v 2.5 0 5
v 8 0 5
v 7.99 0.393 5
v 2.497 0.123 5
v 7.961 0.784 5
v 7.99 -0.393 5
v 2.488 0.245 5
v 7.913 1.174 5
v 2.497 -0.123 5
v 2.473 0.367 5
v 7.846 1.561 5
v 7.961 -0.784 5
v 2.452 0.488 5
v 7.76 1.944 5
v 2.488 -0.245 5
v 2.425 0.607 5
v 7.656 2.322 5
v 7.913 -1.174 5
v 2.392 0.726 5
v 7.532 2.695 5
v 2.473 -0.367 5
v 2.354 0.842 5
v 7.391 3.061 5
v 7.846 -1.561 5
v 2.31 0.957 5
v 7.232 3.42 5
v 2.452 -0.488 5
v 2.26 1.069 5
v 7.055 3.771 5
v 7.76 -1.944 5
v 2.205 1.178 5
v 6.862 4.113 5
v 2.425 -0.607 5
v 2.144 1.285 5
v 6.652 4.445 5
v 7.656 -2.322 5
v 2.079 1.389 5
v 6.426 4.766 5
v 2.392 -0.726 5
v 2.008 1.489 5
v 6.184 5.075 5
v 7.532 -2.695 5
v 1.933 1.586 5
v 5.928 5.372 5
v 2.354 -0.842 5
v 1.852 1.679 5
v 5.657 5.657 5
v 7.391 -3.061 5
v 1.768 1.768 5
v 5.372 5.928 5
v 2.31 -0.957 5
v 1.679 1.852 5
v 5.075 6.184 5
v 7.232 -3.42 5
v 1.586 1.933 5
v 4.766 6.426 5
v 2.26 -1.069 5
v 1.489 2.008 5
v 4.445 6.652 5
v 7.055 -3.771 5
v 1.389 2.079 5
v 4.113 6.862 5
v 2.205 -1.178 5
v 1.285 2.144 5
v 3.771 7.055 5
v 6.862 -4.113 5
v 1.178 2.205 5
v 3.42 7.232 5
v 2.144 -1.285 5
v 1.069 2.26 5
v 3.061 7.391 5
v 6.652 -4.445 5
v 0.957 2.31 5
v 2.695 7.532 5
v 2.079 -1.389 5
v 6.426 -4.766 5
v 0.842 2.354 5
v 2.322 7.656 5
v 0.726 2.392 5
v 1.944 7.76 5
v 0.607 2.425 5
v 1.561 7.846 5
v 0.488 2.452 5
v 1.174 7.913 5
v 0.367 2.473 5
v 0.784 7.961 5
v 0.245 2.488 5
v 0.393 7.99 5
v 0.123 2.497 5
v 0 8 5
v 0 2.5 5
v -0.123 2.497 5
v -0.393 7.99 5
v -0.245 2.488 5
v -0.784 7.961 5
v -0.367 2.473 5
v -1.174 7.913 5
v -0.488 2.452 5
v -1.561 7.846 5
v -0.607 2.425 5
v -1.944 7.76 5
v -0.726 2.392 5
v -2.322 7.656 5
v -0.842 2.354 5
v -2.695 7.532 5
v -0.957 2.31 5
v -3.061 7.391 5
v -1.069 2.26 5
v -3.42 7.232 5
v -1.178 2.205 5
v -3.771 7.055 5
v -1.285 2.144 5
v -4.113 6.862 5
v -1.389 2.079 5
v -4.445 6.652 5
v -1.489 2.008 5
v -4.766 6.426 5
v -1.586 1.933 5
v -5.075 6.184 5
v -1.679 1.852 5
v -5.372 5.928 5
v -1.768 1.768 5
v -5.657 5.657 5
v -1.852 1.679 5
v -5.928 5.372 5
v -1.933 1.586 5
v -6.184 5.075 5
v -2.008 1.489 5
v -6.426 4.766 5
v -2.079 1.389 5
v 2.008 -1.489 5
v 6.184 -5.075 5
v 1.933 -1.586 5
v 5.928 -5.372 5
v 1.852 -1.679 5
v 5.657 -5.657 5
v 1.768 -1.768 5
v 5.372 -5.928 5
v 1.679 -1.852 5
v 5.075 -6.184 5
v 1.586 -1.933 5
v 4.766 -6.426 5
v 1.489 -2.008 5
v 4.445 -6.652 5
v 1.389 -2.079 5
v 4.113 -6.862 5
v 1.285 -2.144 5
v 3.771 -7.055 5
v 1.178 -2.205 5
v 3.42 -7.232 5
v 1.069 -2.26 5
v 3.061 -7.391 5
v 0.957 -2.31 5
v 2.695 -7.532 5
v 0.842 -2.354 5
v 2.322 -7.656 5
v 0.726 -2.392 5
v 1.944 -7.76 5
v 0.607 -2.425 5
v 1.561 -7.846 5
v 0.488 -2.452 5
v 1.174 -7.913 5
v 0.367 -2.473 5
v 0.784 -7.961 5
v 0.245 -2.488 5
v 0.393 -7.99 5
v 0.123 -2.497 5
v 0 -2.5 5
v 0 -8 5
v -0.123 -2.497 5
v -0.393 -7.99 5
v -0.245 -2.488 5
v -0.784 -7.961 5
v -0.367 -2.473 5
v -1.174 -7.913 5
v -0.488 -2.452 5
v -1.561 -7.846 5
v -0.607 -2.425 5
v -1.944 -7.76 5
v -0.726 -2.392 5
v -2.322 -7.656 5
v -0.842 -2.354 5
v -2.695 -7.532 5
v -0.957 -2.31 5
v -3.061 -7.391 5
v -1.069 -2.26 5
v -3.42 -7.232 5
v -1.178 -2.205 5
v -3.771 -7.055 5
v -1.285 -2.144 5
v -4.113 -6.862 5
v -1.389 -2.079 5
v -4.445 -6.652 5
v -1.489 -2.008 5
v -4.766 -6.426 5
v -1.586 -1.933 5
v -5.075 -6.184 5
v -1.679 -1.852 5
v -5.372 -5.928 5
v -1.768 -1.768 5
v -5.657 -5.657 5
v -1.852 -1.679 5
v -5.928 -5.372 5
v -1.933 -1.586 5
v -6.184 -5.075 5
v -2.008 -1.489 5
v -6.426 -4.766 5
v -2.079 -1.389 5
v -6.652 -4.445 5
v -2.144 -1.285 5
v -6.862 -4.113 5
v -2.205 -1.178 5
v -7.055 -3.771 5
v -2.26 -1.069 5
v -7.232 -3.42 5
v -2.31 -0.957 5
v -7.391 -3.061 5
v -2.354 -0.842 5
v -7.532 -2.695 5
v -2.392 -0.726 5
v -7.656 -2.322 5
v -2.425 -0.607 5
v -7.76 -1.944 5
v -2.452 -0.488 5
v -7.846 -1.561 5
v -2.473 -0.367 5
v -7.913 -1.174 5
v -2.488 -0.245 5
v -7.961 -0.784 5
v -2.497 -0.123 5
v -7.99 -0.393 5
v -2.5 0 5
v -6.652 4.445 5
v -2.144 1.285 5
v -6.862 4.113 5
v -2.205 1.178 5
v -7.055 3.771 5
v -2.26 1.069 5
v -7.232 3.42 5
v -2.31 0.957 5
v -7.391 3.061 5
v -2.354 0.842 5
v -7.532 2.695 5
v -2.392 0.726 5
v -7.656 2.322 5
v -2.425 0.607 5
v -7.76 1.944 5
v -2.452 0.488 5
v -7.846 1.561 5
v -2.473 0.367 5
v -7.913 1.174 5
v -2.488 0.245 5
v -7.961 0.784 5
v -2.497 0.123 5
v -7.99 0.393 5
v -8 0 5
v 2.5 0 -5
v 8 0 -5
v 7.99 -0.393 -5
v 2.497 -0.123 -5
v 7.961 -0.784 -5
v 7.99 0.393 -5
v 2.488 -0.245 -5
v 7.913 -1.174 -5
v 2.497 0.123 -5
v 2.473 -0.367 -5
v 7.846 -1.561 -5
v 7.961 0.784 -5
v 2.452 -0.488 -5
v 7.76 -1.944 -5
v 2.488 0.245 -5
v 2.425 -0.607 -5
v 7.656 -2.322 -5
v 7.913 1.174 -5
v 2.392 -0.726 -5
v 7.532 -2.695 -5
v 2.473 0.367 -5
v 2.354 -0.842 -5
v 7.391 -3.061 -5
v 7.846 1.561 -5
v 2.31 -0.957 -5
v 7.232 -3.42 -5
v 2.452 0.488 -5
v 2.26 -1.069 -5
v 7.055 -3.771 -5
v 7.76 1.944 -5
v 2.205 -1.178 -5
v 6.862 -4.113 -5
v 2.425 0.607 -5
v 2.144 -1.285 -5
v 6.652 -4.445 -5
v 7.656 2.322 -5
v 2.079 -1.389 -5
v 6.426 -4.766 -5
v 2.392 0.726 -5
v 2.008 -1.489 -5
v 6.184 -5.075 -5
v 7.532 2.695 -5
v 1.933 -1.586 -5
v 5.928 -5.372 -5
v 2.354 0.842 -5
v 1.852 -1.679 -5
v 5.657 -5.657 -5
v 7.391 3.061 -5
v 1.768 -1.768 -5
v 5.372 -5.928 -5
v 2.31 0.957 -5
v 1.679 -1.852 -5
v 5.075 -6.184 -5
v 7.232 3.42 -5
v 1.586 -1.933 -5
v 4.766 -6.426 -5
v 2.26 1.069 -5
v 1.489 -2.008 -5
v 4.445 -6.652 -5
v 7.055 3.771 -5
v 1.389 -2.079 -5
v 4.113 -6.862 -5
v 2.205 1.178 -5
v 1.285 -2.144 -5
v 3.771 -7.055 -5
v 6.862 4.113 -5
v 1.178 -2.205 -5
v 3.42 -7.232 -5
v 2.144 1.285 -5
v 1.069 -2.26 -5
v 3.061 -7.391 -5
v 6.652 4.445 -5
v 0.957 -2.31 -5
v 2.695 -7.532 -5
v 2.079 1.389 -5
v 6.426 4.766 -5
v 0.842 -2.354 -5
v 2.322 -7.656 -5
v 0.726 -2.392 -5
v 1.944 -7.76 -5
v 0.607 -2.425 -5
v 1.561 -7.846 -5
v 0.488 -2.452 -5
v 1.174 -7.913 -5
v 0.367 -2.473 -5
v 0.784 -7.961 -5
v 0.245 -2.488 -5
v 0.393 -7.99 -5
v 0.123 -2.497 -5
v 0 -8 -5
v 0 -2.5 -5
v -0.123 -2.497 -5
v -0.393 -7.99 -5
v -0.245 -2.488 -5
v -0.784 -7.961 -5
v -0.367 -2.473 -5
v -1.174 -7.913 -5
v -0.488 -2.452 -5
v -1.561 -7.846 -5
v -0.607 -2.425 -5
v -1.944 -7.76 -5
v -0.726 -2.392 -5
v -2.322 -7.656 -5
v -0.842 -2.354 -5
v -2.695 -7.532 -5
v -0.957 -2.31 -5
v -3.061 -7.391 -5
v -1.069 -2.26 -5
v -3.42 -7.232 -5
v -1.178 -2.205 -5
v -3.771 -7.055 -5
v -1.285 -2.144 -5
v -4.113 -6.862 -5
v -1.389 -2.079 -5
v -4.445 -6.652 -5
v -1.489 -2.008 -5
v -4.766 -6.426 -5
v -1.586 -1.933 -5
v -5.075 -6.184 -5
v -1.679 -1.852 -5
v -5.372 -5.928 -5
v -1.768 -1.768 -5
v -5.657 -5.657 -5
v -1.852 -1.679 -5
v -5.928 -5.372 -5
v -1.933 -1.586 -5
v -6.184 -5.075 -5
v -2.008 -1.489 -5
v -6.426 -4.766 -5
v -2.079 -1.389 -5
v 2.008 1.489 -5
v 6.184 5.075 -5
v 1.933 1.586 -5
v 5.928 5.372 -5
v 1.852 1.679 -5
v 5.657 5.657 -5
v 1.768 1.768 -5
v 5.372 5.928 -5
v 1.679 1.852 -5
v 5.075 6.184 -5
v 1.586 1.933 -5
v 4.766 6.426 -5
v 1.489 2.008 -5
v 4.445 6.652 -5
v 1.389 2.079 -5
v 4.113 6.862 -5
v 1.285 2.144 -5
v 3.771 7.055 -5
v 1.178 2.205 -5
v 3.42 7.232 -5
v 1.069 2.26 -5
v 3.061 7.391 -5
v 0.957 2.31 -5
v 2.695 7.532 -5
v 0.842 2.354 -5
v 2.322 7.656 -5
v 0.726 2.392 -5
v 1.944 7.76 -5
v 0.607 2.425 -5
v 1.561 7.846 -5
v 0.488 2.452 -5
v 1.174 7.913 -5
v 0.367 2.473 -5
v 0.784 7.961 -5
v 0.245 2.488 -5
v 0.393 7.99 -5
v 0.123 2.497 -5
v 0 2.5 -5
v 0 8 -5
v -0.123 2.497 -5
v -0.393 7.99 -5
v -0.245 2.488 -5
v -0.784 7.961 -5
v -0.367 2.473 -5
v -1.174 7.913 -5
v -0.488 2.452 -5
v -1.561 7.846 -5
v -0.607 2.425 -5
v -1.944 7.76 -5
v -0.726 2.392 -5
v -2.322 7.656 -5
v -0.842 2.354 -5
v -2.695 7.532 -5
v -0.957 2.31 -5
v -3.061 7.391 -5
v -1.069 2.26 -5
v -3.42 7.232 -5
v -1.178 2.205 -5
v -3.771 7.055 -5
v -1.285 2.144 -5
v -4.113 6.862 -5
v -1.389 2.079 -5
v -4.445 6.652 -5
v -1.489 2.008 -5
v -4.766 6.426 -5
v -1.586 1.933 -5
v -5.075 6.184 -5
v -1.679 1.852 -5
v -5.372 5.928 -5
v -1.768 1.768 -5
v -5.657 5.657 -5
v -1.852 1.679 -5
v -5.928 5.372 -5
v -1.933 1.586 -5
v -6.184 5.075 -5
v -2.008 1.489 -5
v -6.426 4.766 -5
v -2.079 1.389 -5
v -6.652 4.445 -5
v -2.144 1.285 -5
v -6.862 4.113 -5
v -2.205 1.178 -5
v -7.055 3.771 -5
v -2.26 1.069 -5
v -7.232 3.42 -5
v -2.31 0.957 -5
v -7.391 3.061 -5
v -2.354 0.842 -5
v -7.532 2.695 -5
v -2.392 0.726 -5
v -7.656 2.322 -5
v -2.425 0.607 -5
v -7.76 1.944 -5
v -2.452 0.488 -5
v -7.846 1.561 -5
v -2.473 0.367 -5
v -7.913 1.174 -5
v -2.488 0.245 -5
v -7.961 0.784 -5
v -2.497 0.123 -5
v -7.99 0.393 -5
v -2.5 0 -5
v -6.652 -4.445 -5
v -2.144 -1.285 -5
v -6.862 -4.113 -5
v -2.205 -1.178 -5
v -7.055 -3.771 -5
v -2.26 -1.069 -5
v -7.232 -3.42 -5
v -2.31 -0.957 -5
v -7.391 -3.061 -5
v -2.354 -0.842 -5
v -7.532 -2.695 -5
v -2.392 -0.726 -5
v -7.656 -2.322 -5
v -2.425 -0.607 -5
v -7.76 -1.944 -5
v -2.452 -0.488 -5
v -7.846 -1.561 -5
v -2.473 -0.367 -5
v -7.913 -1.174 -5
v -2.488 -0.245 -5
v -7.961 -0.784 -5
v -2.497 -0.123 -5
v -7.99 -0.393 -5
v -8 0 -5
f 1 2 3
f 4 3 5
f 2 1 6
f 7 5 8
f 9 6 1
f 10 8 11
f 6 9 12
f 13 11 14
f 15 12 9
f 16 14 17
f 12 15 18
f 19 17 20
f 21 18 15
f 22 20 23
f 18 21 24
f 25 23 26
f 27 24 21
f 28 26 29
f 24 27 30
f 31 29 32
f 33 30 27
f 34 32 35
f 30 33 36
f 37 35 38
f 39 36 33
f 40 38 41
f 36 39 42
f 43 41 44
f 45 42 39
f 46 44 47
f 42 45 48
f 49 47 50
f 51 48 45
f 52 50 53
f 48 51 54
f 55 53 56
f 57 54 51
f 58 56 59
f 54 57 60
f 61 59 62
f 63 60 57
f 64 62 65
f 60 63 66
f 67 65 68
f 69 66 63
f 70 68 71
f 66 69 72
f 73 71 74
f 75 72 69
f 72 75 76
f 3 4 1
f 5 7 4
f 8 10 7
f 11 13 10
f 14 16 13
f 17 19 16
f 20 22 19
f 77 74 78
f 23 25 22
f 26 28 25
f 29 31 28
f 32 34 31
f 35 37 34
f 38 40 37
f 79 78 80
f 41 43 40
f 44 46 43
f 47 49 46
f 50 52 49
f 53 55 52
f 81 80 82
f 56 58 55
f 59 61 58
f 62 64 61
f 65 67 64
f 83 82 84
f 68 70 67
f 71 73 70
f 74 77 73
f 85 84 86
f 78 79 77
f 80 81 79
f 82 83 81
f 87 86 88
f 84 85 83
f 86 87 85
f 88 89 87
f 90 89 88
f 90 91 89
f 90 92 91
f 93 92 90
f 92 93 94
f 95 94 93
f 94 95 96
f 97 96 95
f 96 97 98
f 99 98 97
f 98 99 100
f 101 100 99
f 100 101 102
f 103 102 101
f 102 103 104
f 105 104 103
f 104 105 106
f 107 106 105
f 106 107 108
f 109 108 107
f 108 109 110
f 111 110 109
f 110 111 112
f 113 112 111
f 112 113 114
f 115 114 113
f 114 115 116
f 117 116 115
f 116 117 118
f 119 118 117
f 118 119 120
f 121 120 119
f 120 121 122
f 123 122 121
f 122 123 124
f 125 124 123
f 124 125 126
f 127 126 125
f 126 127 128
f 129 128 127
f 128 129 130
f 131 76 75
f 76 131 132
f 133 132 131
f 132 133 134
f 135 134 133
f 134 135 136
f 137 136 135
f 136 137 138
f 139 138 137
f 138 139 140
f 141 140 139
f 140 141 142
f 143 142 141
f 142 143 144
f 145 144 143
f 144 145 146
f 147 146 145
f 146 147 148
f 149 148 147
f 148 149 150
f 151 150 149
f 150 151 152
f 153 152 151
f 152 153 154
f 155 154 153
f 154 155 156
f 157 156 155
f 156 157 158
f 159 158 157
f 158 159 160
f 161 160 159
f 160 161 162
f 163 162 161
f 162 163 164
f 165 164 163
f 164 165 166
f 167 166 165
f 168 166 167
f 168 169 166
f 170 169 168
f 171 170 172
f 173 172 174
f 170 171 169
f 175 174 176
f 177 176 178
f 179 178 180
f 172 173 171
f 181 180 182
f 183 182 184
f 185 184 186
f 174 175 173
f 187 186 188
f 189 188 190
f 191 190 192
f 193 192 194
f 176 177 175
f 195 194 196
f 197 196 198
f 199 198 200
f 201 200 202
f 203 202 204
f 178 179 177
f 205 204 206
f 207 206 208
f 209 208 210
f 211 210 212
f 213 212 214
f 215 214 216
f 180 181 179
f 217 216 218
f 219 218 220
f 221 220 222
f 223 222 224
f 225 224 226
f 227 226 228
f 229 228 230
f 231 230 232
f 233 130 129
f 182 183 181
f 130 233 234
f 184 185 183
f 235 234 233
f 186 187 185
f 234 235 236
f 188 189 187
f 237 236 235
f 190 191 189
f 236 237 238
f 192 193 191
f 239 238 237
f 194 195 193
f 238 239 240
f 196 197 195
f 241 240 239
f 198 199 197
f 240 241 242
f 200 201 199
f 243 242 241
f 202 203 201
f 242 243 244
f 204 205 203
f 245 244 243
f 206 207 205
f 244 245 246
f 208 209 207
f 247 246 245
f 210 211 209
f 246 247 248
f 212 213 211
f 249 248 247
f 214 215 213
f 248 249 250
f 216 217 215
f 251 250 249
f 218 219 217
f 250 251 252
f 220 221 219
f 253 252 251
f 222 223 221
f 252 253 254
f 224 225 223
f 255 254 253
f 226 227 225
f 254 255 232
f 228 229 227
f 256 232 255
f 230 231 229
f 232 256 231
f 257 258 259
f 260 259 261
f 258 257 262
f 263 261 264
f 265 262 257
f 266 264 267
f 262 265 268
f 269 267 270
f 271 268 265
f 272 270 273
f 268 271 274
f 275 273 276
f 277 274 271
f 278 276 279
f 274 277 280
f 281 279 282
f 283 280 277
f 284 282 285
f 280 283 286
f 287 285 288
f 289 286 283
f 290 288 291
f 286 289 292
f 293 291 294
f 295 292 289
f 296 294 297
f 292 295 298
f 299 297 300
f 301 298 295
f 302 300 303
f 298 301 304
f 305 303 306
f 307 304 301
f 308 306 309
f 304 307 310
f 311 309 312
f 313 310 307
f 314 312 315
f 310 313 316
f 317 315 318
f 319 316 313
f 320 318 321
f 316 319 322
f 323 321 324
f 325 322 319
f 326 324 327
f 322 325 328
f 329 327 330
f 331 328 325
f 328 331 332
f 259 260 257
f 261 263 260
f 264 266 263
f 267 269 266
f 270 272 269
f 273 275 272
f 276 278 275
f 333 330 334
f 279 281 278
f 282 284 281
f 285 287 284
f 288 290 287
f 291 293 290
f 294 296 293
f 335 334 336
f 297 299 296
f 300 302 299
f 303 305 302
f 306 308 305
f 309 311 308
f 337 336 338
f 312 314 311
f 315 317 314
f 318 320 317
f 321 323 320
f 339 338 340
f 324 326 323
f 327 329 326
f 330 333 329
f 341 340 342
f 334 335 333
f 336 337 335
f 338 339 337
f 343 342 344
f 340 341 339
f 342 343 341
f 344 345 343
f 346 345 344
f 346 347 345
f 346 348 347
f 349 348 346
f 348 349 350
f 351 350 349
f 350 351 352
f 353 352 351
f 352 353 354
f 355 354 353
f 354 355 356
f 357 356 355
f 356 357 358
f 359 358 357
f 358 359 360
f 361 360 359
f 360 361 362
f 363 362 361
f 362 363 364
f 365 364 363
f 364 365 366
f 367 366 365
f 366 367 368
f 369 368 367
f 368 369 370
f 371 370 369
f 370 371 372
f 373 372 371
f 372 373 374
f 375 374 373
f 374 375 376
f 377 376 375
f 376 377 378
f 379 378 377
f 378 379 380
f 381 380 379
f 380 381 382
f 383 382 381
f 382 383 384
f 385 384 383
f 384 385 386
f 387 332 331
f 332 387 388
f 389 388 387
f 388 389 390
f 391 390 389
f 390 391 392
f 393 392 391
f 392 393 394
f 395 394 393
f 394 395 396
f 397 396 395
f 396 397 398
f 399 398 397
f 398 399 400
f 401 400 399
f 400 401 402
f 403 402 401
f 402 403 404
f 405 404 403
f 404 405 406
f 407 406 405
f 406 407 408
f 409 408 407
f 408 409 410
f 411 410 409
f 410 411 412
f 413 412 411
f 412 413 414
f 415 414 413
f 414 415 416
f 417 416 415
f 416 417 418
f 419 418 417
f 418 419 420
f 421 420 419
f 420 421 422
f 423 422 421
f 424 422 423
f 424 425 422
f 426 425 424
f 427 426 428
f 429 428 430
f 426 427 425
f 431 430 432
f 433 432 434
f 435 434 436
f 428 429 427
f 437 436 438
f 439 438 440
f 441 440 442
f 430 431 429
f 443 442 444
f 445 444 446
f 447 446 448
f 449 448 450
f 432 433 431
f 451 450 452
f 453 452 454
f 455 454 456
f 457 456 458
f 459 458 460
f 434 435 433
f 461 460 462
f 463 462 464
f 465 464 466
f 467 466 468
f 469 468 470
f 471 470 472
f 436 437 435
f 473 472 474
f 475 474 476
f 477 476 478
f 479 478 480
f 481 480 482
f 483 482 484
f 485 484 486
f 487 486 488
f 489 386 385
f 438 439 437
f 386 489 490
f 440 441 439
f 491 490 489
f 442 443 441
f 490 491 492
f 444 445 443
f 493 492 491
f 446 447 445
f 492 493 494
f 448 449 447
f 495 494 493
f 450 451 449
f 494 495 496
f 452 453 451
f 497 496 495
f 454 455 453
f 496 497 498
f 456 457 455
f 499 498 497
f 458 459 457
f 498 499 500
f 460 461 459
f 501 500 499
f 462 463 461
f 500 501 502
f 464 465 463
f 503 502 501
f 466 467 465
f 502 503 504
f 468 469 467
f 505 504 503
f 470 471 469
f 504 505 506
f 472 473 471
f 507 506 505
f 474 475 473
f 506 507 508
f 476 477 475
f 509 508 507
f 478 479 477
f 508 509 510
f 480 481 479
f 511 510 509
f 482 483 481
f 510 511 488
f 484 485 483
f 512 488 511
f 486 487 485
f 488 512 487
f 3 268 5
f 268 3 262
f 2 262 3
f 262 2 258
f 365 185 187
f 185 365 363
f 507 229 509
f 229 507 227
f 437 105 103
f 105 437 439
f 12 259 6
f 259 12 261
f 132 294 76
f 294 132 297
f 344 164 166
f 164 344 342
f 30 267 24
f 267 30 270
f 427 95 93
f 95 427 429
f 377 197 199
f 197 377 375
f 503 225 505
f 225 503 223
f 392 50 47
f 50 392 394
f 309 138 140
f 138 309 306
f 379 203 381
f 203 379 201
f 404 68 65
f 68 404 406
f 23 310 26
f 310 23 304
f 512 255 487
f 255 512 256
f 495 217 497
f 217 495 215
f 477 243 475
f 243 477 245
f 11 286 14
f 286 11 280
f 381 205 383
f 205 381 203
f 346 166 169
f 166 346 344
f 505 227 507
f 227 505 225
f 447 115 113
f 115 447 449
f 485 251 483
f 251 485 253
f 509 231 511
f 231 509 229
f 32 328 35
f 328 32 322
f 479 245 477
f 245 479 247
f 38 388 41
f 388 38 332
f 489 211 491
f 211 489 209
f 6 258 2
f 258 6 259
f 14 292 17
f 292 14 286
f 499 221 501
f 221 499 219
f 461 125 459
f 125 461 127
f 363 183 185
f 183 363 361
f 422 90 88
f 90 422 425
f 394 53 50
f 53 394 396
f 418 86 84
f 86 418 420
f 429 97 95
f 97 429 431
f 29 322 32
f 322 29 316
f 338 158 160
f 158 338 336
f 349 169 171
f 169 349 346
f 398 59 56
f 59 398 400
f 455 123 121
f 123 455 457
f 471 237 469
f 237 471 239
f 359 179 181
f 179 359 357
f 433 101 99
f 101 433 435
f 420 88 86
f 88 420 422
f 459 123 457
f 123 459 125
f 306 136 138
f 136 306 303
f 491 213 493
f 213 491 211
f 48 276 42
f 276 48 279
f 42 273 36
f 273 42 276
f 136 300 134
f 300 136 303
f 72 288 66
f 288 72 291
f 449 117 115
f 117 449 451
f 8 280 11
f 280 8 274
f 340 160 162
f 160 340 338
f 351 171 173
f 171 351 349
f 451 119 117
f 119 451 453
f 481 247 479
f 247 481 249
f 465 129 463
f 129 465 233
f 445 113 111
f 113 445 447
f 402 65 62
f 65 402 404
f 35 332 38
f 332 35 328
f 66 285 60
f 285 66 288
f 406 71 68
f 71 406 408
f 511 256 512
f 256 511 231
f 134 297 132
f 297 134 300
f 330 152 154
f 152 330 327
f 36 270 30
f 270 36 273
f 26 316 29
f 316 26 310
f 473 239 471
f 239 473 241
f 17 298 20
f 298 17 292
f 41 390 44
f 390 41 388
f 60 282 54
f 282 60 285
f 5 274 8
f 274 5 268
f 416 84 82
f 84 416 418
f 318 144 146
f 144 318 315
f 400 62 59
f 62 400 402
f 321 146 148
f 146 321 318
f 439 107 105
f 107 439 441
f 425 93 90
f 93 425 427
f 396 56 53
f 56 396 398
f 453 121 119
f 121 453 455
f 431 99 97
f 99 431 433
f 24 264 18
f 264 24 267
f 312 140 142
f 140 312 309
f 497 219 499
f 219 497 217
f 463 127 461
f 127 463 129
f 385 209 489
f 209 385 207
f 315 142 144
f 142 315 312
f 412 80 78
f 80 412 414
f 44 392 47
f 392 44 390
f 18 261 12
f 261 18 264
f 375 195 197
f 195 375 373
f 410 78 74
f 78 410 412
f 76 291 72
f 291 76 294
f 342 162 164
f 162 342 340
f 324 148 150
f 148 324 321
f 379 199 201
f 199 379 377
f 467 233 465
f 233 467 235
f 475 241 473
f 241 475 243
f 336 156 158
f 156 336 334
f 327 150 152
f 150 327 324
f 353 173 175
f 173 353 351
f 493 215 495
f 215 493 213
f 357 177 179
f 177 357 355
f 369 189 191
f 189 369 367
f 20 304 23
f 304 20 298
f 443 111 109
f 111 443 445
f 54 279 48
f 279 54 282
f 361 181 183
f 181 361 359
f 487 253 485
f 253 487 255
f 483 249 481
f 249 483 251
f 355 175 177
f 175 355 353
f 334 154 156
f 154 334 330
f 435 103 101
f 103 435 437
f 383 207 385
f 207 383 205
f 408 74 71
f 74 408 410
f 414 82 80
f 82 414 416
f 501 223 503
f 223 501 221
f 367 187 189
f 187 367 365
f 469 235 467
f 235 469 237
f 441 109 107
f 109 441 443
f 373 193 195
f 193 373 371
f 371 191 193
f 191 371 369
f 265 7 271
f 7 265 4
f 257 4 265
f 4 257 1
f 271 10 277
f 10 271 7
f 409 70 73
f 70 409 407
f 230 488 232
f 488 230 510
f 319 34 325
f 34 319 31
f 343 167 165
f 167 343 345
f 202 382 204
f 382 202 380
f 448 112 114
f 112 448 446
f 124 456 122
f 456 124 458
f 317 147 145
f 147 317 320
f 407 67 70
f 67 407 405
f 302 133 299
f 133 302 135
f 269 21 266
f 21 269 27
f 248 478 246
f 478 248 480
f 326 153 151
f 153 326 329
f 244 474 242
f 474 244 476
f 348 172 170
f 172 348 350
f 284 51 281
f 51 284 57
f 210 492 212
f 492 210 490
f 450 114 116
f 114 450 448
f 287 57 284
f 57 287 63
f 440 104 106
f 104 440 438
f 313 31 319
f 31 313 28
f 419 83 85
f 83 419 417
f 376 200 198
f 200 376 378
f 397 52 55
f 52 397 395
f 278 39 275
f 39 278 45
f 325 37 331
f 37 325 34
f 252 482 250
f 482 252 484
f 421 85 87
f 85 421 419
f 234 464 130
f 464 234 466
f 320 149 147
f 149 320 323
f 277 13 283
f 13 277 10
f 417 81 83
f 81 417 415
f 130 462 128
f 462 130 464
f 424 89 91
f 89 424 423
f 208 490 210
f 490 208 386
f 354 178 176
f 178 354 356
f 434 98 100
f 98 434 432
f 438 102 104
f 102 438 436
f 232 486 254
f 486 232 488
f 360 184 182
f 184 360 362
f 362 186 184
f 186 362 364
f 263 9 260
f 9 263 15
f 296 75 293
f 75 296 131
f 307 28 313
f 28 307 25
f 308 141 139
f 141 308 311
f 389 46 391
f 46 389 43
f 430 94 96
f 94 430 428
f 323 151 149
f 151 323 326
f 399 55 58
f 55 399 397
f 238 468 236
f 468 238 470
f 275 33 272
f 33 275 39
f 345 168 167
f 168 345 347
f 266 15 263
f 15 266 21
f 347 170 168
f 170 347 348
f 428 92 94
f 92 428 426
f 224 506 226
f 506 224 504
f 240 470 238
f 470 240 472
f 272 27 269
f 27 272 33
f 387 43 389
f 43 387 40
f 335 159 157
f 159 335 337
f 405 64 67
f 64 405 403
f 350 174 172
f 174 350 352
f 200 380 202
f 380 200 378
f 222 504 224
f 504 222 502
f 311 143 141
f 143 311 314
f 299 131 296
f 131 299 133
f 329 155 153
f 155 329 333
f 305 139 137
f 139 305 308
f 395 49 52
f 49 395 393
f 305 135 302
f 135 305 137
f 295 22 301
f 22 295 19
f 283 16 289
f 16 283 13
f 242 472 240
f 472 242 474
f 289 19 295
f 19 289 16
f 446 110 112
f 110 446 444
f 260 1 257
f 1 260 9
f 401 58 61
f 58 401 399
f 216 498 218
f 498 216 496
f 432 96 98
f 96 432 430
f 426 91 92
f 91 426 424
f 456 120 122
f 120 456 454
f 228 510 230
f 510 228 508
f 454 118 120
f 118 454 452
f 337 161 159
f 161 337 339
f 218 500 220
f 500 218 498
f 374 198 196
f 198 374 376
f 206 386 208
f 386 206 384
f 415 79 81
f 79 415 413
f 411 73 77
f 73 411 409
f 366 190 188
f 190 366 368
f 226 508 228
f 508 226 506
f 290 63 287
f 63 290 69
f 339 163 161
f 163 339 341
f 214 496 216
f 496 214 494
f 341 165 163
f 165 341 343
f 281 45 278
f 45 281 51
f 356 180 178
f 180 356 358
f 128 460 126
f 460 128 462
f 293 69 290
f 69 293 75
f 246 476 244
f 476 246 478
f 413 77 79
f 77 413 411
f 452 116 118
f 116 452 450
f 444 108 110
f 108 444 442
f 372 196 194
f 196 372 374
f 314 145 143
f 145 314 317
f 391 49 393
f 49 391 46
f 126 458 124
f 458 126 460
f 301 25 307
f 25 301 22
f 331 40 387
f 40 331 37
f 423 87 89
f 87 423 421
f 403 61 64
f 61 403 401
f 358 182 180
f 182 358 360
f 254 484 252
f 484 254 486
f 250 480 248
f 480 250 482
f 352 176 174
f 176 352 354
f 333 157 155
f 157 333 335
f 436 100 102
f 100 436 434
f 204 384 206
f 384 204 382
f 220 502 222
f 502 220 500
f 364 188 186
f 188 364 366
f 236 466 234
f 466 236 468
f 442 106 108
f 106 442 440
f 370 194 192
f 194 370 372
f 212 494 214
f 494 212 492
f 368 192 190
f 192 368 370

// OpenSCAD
$fn=128;

teeth = 20;
pitch_d = 12.22;
pitch_r = pitch_d/2;

pulley_width = 10;
hub_d = 16;
hub_r = hub_d/2;

bore_d = 5;
bore_r = bore_d/2;

tooth_height = 1.2;
tooth_tip_width = 1.2;
tooth_root_width = 2.0;

root_r = pitch_r - tooth_height*0.55;
tip_r  = pitch_r + tooth_height*0.45;

module tooth2d(root_w, tip_w, r0, r1){
    polygon(points=[
        [-root_w/2, r0],
        [ root_w/2, r0],
        [ tip_w/2,  r1],
        [-tip_w/2,  r1]
    ]);
}

module pulley_body(){
    union(){
        cylinder(h=pulley_width, r=root_r, center=true);
        cylinder(h=pulley_width, r=hub_r, center=true);
    }
}

module teeth_ring(){
    for(i=[0:teeth-1]){
        rotate([0,0, i*360/teeth])
            linear_extrude(height=pulley_width, center=true)
                tooth2d(tooth_root_width, tooth_tip_width, root_r, tip_r);
    }
}

difference(){
    union(){
        pulley_body();
        teeth_ring();
    }
    cylinder(h=pulley_width+2, r=bore_r, center=true);
}
